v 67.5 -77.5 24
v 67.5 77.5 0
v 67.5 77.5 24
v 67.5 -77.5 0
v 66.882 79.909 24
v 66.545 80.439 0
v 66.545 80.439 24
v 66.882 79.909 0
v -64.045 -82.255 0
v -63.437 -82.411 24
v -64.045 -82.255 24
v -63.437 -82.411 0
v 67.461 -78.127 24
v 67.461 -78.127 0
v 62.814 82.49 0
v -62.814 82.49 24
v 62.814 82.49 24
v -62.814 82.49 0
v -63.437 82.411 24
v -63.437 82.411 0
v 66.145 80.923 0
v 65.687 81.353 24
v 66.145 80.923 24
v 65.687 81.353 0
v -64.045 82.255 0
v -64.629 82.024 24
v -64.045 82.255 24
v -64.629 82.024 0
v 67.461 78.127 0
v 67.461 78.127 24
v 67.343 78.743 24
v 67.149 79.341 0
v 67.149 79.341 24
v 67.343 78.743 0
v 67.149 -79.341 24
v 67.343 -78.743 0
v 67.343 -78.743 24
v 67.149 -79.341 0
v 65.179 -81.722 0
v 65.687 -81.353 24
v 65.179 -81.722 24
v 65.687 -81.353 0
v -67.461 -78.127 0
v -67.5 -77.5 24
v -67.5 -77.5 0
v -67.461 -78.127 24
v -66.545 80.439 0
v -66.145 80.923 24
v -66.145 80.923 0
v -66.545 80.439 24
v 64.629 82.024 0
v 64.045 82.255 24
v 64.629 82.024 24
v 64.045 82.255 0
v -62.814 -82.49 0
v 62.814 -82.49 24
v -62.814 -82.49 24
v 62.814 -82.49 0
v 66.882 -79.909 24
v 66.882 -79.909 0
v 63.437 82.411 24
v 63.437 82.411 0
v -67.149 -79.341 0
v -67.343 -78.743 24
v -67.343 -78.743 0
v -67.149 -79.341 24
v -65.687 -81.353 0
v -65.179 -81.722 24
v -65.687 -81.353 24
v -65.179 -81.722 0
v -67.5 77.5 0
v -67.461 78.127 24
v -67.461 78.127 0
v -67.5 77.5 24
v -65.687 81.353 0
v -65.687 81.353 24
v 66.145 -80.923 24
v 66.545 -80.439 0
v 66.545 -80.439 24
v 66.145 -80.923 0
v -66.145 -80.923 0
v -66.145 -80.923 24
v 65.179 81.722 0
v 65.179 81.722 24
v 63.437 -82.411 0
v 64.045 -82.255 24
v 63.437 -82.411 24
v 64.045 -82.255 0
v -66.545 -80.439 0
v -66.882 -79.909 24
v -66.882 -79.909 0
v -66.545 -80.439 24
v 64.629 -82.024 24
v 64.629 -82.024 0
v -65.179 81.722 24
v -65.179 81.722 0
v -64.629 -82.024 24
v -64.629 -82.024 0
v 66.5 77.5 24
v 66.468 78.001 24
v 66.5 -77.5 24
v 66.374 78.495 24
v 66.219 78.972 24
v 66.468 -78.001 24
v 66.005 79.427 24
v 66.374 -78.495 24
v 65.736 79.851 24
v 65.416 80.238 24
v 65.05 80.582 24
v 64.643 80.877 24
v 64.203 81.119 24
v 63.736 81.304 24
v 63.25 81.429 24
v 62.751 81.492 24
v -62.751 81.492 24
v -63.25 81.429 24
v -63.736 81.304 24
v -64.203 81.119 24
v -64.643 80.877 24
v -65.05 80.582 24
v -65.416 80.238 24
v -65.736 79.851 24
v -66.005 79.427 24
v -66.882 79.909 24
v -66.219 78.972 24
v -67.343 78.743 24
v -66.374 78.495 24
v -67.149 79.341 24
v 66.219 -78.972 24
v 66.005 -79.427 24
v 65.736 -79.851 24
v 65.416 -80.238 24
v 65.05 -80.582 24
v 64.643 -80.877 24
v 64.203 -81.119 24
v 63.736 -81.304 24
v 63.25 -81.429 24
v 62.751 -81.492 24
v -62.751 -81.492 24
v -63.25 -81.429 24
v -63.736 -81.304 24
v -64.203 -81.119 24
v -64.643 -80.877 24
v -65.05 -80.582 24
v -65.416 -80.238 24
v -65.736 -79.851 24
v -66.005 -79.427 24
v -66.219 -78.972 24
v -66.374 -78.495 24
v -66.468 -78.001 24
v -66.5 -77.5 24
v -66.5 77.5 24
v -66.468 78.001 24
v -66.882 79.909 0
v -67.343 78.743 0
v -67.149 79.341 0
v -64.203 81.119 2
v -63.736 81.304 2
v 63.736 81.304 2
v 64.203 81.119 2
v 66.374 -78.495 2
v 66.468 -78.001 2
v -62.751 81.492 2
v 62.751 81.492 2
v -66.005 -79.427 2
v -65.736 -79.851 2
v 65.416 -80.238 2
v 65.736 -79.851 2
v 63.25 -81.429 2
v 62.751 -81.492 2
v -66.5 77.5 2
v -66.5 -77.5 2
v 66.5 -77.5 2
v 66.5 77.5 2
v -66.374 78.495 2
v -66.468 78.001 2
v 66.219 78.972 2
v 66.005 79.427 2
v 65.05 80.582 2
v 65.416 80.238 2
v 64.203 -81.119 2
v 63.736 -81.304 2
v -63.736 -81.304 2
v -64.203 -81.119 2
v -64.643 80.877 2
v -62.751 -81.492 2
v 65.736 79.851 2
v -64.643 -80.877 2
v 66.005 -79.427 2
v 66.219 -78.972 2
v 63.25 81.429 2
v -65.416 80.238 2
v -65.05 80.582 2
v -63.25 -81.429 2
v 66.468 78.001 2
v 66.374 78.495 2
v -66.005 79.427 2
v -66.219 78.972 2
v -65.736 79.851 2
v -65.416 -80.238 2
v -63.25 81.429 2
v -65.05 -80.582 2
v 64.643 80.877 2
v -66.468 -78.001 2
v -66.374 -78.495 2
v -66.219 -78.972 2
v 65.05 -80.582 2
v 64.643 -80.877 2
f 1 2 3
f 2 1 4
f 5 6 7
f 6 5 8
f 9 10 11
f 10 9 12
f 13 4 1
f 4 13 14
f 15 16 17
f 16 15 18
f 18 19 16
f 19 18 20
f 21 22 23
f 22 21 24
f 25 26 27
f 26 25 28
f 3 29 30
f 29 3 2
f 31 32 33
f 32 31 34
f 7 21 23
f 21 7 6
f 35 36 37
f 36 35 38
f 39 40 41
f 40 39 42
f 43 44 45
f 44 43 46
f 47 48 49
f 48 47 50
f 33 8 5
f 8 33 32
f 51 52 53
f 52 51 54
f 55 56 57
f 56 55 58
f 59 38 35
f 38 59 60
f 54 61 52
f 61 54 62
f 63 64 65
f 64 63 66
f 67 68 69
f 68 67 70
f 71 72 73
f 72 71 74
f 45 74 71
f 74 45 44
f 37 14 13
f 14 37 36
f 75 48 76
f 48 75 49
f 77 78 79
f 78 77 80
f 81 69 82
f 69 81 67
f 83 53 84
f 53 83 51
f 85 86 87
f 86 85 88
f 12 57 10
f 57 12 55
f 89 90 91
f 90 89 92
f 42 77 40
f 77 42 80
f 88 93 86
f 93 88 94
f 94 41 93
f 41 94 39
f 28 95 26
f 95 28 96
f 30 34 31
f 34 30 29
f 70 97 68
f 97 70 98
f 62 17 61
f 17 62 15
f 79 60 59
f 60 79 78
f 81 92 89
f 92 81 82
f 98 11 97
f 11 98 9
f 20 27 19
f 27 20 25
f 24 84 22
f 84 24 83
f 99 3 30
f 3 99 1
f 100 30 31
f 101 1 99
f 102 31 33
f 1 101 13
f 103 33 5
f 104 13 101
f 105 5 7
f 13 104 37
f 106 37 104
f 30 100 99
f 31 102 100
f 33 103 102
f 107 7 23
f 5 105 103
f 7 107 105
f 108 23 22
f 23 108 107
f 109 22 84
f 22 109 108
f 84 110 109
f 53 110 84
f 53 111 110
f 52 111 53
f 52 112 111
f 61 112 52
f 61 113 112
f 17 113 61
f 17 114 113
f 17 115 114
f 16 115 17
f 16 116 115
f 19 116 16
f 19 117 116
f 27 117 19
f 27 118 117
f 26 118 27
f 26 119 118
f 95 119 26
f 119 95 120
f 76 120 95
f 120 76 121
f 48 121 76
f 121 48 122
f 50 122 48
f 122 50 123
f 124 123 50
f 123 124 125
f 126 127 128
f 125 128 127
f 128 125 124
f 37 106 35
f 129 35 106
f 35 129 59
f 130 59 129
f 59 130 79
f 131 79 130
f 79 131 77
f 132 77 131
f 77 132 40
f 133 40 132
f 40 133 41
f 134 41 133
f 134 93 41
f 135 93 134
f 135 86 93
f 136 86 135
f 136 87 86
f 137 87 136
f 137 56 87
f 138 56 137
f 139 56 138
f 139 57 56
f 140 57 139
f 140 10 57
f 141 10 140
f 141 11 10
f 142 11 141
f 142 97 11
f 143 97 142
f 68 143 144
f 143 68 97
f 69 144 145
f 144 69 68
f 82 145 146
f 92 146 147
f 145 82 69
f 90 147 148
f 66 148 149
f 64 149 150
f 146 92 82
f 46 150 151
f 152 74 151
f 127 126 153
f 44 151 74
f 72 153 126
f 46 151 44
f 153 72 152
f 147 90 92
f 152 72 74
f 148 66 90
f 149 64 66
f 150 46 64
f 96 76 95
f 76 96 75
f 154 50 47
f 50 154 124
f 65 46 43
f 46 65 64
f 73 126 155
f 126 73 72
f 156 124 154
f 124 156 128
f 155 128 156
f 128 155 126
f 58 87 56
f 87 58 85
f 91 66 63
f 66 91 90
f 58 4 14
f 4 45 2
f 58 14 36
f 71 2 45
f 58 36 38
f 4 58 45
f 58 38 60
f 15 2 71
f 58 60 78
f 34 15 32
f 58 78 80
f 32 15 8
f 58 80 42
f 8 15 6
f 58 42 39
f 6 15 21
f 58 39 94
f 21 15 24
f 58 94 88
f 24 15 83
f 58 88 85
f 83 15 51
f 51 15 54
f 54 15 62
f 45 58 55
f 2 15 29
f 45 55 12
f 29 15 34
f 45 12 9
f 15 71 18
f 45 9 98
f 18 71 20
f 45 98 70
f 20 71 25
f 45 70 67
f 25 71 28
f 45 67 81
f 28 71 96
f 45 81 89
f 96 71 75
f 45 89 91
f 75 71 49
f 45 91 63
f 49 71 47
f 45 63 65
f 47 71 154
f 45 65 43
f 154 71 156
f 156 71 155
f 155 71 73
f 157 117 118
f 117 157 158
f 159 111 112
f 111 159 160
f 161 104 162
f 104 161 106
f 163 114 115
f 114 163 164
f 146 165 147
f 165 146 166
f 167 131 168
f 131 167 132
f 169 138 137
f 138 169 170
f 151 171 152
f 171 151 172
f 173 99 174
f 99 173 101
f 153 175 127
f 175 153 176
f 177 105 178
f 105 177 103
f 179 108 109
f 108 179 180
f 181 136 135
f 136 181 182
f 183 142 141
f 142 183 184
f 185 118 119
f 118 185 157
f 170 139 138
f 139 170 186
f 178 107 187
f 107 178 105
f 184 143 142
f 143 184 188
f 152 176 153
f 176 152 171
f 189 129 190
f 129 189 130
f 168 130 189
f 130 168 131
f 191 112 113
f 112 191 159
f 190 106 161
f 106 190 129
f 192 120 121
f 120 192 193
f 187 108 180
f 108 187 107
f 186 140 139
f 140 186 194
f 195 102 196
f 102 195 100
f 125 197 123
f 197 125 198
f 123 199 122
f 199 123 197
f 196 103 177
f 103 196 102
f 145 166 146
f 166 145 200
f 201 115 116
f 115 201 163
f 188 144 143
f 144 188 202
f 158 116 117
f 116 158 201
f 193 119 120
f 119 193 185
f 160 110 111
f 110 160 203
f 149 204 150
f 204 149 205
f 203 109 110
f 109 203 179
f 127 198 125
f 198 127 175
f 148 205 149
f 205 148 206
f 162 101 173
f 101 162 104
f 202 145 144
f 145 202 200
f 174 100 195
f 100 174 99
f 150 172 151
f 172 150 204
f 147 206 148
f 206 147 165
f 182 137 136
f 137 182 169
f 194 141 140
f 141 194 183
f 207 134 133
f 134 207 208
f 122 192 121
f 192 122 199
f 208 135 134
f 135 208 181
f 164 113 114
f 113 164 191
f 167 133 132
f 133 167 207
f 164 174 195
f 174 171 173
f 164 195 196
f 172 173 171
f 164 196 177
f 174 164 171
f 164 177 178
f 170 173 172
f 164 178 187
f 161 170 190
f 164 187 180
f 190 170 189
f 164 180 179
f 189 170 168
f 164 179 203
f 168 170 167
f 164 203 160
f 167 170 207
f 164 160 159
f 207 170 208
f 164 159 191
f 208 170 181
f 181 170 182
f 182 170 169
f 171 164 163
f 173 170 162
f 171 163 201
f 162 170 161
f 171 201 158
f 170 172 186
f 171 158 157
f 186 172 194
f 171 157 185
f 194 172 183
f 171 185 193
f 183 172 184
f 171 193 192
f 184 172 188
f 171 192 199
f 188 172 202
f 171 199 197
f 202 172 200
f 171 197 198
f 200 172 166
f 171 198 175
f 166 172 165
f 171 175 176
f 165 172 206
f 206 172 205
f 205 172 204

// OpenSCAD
$fn = 50;


difference() {
	union() {
		hull() {
			translate(v = [-62.5000000000, 77.5000000000, 0]) {
				cylinder(h = 24, r = 5);
			}
			translate(v = [62.5000000000, 77.5000000000, 0]) {
				cylinder(h = 24, r = 5);
			}
			translate(v = [-62.5000000000, -77.5000000000, 0]) {
				cylinder(h = 24, r = 5);
			}
			translate(v = [62.5000000000, -77.5000000000, 0]) {
				cylinder(h = 24, r = 5);
			}
		}
	}
	union() {
		translate(v = [0, 0, 2]) {
			hull() {
				translate(v = [-62.5000000000, 77.5000000000, 0]) {
					cylinder(h = 22, r = 4);
				}
				translate(v = [62.5000000000, 77.5000000000, 0]) {
					cylinder(h = 22, r = 4);
				}
				translate(v = [-62.5000000000, -77.5000000000, 0]) {
					cylinder(h = 22, r = 4);
				}
				translate(v = [62.5000000000, -77.5000000000, 0]) {
					cylinder(h = 22, r = 4);
				}
			}
		}
	}
}
